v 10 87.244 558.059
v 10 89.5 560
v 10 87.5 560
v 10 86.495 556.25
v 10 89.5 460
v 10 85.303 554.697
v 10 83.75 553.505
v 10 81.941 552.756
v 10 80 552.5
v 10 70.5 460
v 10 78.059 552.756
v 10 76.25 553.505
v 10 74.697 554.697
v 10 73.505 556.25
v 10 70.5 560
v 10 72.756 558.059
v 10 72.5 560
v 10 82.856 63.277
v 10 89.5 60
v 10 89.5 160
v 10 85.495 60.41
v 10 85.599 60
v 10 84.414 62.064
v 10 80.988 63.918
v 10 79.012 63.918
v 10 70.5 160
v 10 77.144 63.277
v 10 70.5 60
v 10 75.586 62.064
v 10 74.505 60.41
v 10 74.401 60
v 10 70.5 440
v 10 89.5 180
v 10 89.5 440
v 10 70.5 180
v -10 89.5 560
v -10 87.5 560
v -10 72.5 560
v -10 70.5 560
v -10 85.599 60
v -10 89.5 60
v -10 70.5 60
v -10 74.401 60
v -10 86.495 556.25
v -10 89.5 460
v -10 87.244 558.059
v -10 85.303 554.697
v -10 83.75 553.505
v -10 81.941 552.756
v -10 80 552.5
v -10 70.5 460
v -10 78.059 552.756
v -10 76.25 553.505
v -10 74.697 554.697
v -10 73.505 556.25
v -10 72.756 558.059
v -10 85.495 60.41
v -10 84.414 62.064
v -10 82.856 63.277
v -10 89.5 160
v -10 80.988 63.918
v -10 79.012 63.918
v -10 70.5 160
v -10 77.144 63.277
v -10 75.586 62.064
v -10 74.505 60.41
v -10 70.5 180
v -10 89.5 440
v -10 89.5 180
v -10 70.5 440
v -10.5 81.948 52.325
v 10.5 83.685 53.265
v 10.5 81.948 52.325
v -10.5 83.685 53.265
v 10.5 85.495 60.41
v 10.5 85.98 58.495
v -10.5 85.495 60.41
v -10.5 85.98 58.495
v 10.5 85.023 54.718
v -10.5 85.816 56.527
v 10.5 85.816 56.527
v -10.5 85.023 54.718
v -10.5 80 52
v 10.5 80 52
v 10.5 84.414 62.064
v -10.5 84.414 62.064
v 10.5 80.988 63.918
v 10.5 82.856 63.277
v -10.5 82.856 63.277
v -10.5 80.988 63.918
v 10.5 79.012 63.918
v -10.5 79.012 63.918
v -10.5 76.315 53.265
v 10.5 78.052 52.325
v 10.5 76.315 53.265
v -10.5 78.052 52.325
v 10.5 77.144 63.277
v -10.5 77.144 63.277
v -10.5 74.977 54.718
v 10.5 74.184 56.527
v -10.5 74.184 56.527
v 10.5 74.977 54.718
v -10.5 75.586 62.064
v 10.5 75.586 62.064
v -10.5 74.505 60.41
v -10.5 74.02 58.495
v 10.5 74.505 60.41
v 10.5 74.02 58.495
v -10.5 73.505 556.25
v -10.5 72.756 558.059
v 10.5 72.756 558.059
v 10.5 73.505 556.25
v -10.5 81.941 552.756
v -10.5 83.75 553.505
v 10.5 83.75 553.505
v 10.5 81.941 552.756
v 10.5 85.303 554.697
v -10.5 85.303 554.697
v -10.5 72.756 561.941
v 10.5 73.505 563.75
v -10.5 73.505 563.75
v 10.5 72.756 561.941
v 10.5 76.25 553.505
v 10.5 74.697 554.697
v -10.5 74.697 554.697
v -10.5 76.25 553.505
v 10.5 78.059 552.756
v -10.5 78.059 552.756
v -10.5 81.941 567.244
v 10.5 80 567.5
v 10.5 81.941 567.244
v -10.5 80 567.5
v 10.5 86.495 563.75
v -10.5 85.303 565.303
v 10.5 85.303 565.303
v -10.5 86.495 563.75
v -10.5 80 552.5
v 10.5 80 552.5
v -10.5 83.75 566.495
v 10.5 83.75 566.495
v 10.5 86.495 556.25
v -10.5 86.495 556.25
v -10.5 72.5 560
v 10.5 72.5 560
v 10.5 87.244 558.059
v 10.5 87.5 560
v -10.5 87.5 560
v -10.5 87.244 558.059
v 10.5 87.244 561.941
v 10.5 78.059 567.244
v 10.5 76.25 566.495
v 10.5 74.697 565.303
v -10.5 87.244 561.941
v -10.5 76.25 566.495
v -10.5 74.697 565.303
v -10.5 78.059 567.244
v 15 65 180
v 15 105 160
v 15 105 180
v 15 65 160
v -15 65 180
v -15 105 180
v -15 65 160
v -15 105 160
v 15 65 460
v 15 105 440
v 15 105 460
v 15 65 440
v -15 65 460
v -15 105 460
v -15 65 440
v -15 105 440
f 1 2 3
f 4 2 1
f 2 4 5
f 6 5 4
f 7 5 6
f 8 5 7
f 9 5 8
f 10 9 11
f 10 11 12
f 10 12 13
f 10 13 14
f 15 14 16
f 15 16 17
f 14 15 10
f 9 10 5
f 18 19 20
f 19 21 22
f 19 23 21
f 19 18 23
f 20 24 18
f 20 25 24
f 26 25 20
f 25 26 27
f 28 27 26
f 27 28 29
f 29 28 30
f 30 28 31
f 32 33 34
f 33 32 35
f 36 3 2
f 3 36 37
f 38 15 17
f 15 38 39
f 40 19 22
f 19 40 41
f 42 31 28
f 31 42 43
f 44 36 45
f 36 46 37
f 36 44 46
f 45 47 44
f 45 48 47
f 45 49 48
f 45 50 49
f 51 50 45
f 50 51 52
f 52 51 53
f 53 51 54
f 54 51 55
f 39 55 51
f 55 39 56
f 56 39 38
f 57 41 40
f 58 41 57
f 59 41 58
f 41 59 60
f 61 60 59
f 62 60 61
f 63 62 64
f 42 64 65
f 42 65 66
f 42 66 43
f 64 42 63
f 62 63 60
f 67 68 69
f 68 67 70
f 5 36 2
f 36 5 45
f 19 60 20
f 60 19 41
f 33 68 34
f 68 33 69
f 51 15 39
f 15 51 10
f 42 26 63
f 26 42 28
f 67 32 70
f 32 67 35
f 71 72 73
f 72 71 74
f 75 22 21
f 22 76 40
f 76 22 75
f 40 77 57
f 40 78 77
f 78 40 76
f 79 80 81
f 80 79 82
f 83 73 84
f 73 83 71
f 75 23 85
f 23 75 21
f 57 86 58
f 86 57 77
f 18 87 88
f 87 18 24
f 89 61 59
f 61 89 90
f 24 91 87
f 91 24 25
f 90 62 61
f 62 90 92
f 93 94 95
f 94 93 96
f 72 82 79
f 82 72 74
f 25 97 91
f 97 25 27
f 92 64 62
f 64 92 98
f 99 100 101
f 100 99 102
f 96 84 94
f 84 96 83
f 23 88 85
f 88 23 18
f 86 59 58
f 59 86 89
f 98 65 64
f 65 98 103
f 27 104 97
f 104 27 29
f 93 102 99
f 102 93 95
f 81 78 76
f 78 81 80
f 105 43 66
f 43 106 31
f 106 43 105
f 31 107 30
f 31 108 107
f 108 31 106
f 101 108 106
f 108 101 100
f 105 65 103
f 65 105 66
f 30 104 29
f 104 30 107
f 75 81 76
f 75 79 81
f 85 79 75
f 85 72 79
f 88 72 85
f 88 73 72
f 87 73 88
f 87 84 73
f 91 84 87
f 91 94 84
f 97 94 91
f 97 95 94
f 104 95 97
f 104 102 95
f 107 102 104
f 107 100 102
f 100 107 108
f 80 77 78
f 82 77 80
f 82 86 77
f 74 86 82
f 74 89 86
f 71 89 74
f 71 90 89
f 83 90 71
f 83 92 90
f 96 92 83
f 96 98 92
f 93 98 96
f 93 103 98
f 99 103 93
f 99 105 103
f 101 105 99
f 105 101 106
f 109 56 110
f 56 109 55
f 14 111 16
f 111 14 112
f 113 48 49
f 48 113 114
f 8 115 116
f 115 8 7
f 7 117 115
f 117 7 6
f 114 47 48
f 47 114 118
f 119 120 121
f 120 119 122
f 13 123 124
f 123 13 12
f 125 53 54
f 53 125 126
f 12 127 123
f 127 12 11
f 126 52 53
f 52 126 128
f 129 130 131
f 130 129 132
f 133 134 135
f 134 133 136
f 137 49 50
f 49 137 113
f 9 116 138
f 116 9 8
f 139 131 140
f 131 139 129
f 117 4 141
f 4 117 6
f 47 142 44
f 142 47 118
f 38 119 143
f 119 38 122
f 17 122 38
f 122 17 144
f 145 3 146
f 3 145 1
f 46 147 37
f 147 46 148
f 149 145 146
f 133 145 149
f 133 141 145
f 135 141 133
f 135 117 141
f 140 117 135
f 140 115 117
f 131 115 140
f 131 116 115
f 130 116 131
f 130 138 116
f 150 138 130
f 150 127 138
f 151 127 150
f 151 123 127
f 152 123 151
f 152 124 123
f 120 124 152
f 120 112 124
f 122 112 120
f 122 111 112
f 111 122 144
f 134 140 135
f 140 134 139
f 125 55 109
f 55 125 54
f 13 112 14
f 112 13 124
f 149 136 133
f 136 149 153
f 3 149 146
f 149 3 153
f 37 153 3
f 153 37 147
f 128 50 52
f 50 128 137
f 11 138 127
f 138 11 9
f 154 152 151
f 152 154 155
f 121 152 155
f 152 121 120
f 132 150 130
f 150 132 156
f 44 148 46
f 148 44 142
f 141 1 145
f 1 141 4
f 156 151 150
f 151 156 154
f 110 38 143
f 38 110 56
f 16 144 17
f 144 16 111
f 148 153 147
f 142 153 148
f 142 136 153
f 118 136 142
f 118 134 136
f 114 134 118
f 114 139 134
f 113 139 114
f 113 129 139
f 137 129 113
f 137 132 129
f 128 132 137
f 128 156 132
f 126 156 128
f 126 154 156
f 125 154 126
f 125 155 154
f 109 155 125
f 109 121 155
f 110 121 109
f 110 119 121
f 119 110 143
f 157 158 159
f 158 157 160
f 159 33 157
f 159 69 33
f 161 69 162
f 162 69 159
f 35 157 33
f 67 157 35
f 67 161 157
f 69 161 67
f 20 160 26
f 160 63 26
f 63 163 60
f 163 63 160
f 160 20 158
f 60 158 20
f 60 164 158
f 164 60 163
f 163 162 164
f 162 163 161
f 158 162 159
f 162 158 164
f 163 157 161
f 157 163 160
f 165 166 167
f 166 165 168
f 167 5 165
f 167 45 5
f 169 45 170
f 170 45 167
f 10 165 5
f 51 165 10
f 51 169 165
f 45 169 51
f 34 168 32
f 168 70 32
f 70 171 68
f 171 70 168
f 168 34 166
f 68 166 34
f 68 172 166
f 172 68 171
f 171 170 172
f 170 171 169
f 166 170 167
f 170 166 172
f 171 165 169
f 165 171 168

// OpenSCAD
// === STL Reference (visual only, not exported) ===
// %scale(1000) import("l1prime.stl");

// === Bar Dimensions ===
bar_width   = 20;
bar_depth   = 19;
bar_height  = 500;
bar_center_y = 80;
bar_center_z = 310;

translate([0, bar_center_y, bar_center_z])
    cube([bar_width, bar_depth, bar_height], center = true);

// === Rollers ===
roller1_radius = 6;
roller2_radius = 7.5;
roller_depth   = 21;

roller1_z = 58;
roller2_z = 560;
roller_y  = bar_center_y;

module roller(z, r) {
    translate([0, roller_y, z])
        rotate([0, 90, 0])
            cylinder(r = r, h = roller_depth, center = true);
}

roller(roller1_z, roller1_radius);
roller(roller2_z, roller2_radius);

// === Wire Clips ===
clip_width  = 30;
clip_depth  = 40;
clip_height = 20;

clip_y = 85;
clip_bottom_z = 170;
clip_top_z    = 450;

module wire_clip(z) {
    translate([0, clip_y, z])
        cube([clip_width, clip_depth, clip_height], center = true);
}

wire_clip(clip_bottom_z);
wire_clip(clip_top_z);
